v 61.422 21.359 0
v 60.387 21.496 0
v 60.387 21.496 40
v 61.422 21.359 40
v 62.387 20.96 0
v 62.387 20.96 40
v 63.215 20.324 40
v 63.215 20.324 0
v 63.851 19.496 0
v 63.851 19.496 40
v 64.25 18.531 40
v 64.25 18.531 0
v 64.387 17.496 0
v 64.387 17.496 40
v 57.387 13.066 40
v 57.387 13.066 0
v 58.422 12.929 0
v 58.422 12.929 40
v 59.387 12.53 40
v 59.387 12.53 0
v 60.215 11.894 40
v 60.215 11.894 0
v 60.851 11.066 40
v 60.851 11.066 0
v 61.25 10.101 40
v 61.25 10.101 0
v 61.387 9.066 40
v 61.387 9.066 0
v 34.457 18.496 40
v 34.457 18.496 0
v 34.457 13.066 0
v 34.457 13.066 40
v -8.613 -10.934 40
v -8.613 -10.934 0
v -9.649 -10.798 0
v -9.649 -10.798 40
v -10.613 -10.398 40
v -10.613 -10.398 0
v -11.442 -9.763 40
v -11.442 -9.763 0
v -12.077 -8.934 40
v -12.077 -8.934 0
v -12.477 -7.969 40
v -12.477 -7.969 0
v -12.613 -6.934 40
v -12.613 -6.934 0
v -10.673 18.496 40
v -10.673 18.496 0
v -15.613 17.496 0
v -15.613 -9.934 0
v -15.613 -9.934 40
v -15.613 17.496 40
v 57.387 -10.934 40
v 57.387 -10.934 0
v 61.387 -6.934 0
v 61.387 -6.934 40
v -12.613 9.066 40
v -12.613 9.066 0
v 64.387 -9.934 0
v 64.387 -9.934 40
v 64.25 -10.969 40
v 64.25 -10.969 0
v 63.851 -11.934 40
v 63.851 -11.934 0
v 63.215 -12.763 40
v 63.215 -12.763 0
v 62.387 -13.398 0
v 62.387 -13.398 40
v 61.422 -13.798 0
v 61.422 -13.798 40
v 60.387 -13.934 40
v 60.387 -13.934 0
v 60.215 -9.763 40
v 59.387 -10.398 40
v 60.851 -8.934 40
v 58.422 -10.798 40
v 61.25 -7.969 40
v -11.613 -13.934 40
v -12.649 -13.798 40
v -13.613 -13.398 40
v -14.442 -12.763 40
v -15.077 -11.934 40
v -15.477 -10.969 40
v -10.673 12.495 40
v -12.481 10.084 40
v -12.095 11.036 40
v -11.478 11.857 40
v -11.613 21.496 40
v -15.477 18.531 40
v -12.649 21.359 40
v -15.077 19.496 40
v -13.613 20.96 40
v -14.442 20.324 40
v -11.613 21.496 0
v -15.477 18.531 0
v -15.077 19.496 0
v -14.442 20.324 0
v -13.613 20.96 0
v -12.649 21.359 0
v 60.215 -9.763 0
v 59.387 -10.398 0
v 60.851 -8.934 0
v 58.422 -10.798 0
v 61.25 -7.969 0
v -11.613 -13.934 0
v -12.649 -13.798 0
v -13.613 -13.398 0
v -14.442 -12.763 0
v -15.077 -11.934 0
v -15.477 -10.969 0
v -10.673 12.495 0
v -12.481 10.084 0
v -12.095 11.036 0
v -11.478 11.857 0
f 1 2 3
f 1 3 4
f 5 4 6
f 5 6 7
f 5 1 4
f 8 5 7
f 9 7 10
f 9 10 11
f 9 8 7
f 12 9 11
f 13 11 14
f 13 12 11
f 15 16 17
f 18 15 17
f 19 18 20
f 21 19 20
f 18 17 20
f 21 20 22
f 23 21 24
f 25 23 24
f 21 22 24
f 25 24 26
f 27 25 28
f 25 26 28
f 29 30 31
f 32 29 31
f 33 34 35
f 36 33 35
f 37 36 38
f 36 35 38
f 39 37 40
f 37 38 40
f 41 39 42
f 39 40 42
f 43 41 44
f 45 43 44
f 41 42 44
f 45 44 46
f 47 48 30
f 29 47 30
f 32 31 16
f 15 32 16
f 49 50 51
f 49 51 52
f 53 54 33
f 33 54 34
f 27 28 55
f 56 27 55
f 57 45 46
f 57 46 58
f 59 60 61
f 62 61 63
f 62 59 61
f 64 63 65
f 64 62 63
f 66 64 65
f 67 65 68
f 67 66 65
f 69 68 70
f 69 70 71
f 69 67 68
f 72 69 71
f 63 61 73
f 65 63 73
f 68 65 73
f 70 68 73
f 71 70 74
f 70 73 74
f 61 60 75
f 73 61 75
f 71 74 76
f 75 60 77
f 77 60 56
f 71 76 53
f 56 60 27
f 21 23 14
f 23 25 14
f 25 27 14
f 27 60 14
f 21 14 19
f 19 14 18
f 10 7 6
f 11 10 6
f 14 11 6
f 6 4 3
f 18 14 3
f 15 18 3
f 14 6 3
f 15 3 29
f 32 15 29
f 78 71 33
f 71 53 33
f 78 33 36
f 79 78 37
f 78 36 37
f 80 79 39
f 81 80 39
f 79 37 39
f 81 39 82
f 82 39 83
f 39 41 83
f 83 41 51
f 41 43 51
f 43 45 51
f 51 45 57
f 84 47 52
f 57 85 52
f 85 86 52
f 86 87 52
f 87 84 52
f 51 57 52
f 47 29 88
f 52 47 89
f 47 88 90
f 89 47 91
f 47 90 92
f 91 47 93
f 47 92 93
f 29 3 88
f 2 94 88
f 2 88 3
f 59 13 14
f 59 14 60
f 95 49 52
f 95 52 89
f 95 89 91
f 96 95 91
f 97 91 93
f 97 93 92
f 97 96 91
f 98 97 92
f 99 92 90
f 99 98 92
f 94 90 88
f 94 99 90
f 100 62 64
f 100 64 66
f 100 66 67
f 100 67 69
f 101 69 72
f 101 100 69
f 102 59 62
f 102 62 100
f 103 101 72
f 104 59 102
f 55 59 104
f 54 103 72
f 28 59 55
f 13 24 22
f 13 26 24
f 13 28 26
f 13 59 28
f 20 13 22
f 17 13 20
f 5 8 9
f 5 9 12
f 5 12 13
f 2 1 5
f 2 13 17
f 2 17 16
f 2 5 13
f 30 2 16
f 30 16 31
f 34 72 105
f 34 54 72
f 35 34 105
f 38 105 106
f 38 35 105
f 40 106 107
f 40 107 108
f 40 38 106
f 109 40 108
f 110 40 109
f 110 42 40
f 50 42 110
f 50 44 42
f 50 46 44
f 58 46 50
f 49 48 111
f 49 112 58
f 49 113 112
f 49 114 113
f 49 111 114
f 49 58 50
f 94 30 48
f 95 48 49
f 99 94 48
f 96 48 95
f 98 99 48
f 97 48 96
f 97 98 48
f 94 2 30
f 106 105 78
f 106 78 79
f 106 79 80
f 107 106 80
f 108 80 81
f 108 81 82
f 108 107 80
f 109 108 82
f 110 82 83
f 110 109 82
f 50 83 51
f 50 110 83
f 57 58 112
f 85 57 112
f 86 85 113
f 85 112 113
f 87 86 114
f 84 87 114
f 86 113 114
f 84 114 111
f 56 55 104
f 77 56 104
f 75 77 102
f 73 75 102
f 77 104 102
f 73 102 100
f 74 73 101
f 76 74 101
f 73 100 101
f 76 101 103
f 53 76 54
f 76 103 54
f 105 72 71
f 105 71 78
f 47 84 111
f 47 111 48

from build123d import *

# Parameters (mm, degrees)
BOSS_EXTRUDE1_DEPTH = 40


with BuildPart() as part:
    # Sketch1 → Boss-Extrude1 (new body)
    with BuildSketch(Plane.XY):
        with BuildLine():
            Line((-11.613277084, 21.495789474), (60.386722916, 21.495789474))
            ThreePointArc((60.386722916, 21.495789474), (63.21515004, 20.324216598), (64.386722916, 17.495789474))
            Line((64.386722916, 17.495789474), (64.386722916, -9.934210526))
            ThreePointArc((64.386722916, -9.934210526), (63.21515004, -12.762637651), (60.386722916, -13.934210526))
            Line((60.386722916, -13.934210526), (-11.613277084, -13.934210526))
            ThreePointArc((-11.613277084, -13.934210526), (-14.441704209, -12.762637651), (-15.613277084, -9.934210526))
            Line((-15.613277084, -9.934210526), (-15.613277084, 17.495789474))
            ThreePointArc((-15.613277084, 17.495789474), (-14.441704209, 20.324216598), (-11.613277084, 21.495789474))
        make_face()
        with BuildLine():
            Line((-10.673277084, 18.495789474), (34.456722916, 18.495789474))
            Line((34.456722916, 18.495789474), (34.456722916, 13.065789474))
            Line((34.456722916, 13.065789474), (57.386722916, 13.065789474))
            ThreePointArc((57.386722916, 13.065789474), (60.21515004, 11.894216598), (61.386722916, 9.065789474))
            Line((61.386722916, 9.065789474), (61.386722916, -6.934210526))
            ThreePointArc((61.386722916, -6.934210526), (60.21515004, -9.762637651), (57.386722916, -10.934210526))
            Line((57.386722916, -10.934210526), (-8.613277084, -10.934210526))
            ThreePointArc((-8.613277084, -10.934210526), (-11.441704209, -9.762637651), (-12.613277084, -6.934210526))
            Line((-12.613277084, -6.934210526), (-12.613277084, 9.065789474))
            ThreePointArc((-12.613277084, 9.065789474), (-12.094656121, 11.035561034), (-10.673277084, 12.494550183))
            Line((-10.673277084, 12.494550183), (-10.673277084, 13.065789474))
            Line((-10.673277084, 13.065789474), (-10.673277084, 18.495789474))
        make_face(mode=Mode.SUBTRACT)
    extrude(amount=BOSS_EXTRUDE1_DEPTH)


solid = part.part
